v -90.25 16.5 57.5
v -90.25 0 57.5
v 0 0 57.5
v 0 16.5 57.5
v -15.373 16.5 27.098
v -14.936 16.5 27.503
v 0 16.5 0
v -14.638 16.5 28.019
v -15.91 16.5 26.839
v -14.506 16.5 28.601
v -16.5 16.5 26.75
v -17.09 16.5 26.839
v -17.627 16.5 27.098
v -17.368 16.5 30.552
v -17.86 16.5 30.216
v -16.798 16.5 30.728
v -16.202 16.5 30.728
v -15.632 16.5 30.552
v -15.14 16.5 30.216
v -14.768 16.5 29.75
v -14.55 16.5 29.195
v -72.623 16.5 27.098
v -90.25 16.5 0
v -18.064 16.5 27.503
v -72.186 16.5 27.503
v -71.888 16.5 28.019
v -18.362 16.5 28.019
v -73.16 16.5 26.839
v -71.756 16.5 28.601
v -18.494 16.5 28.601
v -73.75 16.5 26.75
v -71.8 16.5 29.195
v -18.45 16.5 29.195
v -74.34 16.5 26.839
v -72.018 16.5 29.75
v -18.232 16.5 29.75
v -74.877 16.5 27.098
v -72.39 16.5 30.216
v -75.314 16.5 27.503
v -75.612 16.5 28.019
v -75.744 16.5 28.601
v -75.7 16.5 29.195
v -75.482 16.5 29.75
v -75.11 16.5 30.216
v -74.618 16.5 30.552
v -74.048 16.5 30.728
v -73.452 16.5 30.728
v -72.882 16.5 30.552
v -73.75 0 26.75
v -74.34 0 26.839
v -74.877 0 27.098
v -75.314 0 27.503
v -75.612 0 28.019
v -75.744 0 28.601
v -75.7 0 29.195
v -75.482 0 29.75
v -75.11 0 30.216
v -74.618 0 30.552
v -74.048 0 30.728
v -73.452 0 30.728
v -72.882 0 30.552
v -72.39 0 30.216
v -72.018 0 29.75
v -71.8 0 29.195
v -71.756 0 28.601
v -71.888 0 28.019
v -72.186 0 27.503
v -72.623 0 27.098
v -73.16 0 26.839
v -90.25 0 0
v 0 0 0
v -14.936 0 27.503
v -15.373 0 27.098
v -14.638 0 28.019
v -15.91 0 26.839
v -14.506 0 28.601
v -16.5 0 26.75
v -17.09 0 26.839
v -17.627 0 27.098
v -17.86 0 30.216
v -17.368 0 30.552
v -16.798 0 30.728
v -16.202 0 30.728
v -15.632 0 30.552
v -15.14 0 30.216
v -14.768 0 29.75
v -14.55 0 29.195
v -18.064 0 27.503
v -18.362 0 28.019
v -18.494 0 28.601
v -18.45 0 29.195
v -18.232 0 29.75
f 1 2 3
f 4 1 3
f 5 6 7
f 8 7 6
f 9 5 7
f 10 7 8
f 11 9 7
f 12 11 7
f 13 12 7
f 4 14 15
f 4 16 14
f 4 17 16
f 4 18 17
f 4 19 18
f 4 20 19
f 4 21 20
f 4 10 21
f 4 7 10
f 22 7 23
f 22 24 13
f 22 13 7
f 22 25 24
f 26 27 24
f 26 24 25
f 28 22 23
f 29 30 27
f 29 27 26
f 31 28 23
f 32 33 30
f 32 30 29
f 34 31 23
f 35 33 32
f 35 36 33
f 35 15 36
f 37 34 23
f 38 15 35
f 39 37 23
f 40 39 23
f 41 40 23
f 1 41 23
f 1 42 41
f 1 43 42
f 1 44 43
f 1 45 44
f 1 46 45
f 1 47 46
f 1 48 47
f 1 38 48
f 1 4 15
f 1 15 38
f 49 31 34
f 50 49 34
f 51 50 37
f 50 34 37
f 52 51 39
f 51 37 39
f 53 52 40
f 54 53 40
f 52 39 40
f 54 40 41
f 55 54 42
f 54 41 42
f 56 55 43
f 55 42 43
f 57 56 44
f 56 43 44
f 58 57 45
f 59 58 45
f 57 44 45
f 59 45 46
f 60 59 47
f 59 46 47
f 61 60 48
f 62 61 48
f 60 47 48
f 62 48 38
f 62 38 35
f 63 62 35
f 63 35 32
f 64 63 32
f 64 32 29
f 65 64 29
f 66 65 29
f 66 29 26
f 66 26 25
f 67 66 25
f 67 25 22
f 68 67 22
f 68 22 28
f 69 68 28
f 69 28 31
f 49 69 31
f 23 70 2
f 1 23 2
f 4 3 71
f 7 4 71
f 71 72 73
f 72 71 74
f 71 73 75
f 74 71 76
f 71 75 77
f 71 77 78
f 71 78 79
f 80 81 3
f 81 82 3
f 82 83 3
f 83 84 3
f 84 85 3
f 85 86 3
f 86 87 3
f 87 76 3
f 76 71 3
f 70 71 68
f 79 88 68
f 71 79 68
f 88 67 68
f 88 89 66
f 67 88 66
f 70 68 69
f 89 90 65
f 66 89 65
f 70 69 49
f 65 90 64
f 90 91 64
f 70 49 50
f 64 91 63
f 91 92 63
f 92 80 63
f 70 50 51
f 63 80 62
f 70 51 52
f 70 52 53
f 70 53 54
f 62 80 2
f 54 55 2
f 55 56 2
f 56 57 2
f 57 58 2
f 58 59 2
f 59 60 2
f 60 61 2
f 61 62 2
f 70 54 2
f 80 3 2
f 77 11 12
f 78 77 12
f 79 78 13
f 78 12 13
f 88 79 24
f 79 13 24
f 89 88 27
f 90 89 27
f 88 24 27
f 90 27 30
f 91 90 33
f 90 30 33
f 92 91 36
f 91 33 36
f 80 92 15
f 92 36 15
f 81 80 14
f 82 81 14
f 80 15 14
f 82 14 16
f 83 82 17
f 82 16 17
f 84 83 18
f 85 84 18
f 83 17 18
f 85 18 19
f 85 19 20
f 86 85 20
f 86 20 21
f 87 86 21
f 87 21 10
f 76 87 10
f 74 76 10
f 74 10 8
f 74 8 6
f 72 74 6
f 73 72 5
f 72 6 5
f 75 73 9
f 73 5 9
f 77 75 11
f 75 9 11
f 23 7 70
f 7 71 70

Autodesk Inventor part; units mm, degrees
ref_plane "YZ Plane" through (0, 0, 0) normal (1, 0, 0) x (0, 1, 0)
ref_plane "XZ Plane" through (0, 0, 0) normal (0, 1, 0) x (-1, 0, 0)
ref_plane "XY Plane" through (0, 0, 0) normal (0, 0, 1) x (1, 0, 0)
sketch "Skizze1" plane through (0, 0, 0) normal (0, 1, 0) x (-1, 0, 0)
  line L0 (0, 0) -> (90.25, 0)
  line L1 (90.25, 0) -> (90.25, 57.5)
  line L2 (90.25, 57.5) -> (0, 57.5)
  line L3 (0, 57.5) -> (0, 0)
  dimension "d0" = 90.25
  dimension "d1" = 57.5
extrude "Extrusion1" add sketch "Skizze1" along normal blind 16.5
hole "Bohrung1" at (-16.5, 0, 28.75) direction (0, 1, 0) diameter 4 end through all
hole "Bohrung2" at (-73.75, 0, 28.75) direction (0, 1, 0) diameter 4 end through all
properties part number "Batteriehalter_6AA" material "PBT-Kunststoff"
